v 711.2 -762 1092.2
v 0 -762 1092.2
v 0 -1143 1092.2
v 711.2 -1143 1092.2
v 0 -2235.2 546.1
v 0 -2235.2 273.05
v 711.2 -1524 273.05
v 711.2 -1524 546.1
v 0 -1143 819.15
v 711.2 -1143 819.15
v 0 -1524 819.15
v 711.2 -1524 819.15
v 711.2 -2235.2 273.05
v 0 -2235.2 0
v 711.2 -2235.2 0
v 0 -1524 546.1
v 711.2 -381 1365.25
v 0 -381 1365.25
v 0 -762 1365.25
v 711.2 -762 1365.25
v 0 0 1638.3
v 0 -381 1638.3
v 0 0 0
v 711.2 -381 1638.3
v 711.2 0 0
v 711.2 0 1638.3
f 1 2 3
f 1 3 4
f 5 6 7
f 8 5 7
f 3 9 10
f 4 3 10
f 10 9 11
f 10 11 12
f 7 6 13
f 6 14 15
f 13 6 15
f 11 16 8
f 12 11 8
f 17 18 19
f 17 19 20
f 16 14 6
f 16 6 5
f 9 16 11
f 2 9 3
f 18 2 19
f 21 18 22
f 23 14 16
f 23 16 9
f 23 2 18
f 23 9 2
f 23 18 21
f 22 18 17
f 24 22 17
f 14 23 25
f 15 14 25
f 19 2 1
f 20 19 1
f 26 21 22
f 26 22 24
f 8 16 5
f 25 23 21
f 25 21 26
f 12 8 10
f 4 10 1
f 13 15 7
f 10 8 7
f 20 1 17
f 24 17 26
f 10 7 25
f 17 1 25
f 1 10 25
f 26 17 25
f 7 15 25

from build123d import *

# Parameters (mm, degrees)
F0_W      = 711.2
F0_H      = 2235.2
F1_DEPTH  = 273.05
F3_DEPTH  = 273.05
F4_W      = 711.2
F4_H      = 1524
F5_DEPTH  = 273.05
F6_W      = 711.2
F6_H      = 1143
F7_DEPTH  = 273.05
F8_W      = 711.2
F8_H      = 762
F9_DEPTH  = 273.05
F10_W     = 711.2
F10_H     = 381
F11_DEPTH = 273.05


with BuildPart() as f1:
    # F0 (on Top) → F1 (new body)
    with BuildSketch(Plane.XY):
        with Locations((355.6, -1117.6)):
            Rectangle(F0_W, F0_H)
    extrude(amount=F1_DEPTH)

    # F2 (on face) → F3 (join)
    with BuildSketch(Plane.XY.offset(273.05)):
        Polygon((0, 0), (0, -2235.2), (711.2, -1524), (711.2, 0), align=None)
    extrude(amount=F3_DEPTH)

    # F4 (on face) → F5 (join)
    with BuildSketch(Plane.XY.offset(546.1)):
        with Locations((355.6, -762)):
            Rectangle(F4_W, F4_H)
    extrude(amount=F5_DEPTH)

    # F6 (on face) → F7 (join)
    with BuildSketch(Plane.XY.offset(819.15)):
        with Locations((355.6, -571.5)):
            Rectangle(F6_W, F6_H)
    extrude(amount=F7_DEPTH)

    # F8 (on face) → F9 (join)
    with BuildSketch(Plane.XY.offset(1092.2)):
        with Locations((355.6, -381)):
            Rectangle(F8_W, F8_H)
    extrude(amount=F9_DEPTH)

    # F10 (on face) → F11 (join)
    with BuildSketch(Plane.XY.offset(1365.25)):
        with Locations((355.6, -190.5)):
            Rectangle(F10_W, F10_H)
    extrude(amount=F11_DEPTH)


solid = f1.part
